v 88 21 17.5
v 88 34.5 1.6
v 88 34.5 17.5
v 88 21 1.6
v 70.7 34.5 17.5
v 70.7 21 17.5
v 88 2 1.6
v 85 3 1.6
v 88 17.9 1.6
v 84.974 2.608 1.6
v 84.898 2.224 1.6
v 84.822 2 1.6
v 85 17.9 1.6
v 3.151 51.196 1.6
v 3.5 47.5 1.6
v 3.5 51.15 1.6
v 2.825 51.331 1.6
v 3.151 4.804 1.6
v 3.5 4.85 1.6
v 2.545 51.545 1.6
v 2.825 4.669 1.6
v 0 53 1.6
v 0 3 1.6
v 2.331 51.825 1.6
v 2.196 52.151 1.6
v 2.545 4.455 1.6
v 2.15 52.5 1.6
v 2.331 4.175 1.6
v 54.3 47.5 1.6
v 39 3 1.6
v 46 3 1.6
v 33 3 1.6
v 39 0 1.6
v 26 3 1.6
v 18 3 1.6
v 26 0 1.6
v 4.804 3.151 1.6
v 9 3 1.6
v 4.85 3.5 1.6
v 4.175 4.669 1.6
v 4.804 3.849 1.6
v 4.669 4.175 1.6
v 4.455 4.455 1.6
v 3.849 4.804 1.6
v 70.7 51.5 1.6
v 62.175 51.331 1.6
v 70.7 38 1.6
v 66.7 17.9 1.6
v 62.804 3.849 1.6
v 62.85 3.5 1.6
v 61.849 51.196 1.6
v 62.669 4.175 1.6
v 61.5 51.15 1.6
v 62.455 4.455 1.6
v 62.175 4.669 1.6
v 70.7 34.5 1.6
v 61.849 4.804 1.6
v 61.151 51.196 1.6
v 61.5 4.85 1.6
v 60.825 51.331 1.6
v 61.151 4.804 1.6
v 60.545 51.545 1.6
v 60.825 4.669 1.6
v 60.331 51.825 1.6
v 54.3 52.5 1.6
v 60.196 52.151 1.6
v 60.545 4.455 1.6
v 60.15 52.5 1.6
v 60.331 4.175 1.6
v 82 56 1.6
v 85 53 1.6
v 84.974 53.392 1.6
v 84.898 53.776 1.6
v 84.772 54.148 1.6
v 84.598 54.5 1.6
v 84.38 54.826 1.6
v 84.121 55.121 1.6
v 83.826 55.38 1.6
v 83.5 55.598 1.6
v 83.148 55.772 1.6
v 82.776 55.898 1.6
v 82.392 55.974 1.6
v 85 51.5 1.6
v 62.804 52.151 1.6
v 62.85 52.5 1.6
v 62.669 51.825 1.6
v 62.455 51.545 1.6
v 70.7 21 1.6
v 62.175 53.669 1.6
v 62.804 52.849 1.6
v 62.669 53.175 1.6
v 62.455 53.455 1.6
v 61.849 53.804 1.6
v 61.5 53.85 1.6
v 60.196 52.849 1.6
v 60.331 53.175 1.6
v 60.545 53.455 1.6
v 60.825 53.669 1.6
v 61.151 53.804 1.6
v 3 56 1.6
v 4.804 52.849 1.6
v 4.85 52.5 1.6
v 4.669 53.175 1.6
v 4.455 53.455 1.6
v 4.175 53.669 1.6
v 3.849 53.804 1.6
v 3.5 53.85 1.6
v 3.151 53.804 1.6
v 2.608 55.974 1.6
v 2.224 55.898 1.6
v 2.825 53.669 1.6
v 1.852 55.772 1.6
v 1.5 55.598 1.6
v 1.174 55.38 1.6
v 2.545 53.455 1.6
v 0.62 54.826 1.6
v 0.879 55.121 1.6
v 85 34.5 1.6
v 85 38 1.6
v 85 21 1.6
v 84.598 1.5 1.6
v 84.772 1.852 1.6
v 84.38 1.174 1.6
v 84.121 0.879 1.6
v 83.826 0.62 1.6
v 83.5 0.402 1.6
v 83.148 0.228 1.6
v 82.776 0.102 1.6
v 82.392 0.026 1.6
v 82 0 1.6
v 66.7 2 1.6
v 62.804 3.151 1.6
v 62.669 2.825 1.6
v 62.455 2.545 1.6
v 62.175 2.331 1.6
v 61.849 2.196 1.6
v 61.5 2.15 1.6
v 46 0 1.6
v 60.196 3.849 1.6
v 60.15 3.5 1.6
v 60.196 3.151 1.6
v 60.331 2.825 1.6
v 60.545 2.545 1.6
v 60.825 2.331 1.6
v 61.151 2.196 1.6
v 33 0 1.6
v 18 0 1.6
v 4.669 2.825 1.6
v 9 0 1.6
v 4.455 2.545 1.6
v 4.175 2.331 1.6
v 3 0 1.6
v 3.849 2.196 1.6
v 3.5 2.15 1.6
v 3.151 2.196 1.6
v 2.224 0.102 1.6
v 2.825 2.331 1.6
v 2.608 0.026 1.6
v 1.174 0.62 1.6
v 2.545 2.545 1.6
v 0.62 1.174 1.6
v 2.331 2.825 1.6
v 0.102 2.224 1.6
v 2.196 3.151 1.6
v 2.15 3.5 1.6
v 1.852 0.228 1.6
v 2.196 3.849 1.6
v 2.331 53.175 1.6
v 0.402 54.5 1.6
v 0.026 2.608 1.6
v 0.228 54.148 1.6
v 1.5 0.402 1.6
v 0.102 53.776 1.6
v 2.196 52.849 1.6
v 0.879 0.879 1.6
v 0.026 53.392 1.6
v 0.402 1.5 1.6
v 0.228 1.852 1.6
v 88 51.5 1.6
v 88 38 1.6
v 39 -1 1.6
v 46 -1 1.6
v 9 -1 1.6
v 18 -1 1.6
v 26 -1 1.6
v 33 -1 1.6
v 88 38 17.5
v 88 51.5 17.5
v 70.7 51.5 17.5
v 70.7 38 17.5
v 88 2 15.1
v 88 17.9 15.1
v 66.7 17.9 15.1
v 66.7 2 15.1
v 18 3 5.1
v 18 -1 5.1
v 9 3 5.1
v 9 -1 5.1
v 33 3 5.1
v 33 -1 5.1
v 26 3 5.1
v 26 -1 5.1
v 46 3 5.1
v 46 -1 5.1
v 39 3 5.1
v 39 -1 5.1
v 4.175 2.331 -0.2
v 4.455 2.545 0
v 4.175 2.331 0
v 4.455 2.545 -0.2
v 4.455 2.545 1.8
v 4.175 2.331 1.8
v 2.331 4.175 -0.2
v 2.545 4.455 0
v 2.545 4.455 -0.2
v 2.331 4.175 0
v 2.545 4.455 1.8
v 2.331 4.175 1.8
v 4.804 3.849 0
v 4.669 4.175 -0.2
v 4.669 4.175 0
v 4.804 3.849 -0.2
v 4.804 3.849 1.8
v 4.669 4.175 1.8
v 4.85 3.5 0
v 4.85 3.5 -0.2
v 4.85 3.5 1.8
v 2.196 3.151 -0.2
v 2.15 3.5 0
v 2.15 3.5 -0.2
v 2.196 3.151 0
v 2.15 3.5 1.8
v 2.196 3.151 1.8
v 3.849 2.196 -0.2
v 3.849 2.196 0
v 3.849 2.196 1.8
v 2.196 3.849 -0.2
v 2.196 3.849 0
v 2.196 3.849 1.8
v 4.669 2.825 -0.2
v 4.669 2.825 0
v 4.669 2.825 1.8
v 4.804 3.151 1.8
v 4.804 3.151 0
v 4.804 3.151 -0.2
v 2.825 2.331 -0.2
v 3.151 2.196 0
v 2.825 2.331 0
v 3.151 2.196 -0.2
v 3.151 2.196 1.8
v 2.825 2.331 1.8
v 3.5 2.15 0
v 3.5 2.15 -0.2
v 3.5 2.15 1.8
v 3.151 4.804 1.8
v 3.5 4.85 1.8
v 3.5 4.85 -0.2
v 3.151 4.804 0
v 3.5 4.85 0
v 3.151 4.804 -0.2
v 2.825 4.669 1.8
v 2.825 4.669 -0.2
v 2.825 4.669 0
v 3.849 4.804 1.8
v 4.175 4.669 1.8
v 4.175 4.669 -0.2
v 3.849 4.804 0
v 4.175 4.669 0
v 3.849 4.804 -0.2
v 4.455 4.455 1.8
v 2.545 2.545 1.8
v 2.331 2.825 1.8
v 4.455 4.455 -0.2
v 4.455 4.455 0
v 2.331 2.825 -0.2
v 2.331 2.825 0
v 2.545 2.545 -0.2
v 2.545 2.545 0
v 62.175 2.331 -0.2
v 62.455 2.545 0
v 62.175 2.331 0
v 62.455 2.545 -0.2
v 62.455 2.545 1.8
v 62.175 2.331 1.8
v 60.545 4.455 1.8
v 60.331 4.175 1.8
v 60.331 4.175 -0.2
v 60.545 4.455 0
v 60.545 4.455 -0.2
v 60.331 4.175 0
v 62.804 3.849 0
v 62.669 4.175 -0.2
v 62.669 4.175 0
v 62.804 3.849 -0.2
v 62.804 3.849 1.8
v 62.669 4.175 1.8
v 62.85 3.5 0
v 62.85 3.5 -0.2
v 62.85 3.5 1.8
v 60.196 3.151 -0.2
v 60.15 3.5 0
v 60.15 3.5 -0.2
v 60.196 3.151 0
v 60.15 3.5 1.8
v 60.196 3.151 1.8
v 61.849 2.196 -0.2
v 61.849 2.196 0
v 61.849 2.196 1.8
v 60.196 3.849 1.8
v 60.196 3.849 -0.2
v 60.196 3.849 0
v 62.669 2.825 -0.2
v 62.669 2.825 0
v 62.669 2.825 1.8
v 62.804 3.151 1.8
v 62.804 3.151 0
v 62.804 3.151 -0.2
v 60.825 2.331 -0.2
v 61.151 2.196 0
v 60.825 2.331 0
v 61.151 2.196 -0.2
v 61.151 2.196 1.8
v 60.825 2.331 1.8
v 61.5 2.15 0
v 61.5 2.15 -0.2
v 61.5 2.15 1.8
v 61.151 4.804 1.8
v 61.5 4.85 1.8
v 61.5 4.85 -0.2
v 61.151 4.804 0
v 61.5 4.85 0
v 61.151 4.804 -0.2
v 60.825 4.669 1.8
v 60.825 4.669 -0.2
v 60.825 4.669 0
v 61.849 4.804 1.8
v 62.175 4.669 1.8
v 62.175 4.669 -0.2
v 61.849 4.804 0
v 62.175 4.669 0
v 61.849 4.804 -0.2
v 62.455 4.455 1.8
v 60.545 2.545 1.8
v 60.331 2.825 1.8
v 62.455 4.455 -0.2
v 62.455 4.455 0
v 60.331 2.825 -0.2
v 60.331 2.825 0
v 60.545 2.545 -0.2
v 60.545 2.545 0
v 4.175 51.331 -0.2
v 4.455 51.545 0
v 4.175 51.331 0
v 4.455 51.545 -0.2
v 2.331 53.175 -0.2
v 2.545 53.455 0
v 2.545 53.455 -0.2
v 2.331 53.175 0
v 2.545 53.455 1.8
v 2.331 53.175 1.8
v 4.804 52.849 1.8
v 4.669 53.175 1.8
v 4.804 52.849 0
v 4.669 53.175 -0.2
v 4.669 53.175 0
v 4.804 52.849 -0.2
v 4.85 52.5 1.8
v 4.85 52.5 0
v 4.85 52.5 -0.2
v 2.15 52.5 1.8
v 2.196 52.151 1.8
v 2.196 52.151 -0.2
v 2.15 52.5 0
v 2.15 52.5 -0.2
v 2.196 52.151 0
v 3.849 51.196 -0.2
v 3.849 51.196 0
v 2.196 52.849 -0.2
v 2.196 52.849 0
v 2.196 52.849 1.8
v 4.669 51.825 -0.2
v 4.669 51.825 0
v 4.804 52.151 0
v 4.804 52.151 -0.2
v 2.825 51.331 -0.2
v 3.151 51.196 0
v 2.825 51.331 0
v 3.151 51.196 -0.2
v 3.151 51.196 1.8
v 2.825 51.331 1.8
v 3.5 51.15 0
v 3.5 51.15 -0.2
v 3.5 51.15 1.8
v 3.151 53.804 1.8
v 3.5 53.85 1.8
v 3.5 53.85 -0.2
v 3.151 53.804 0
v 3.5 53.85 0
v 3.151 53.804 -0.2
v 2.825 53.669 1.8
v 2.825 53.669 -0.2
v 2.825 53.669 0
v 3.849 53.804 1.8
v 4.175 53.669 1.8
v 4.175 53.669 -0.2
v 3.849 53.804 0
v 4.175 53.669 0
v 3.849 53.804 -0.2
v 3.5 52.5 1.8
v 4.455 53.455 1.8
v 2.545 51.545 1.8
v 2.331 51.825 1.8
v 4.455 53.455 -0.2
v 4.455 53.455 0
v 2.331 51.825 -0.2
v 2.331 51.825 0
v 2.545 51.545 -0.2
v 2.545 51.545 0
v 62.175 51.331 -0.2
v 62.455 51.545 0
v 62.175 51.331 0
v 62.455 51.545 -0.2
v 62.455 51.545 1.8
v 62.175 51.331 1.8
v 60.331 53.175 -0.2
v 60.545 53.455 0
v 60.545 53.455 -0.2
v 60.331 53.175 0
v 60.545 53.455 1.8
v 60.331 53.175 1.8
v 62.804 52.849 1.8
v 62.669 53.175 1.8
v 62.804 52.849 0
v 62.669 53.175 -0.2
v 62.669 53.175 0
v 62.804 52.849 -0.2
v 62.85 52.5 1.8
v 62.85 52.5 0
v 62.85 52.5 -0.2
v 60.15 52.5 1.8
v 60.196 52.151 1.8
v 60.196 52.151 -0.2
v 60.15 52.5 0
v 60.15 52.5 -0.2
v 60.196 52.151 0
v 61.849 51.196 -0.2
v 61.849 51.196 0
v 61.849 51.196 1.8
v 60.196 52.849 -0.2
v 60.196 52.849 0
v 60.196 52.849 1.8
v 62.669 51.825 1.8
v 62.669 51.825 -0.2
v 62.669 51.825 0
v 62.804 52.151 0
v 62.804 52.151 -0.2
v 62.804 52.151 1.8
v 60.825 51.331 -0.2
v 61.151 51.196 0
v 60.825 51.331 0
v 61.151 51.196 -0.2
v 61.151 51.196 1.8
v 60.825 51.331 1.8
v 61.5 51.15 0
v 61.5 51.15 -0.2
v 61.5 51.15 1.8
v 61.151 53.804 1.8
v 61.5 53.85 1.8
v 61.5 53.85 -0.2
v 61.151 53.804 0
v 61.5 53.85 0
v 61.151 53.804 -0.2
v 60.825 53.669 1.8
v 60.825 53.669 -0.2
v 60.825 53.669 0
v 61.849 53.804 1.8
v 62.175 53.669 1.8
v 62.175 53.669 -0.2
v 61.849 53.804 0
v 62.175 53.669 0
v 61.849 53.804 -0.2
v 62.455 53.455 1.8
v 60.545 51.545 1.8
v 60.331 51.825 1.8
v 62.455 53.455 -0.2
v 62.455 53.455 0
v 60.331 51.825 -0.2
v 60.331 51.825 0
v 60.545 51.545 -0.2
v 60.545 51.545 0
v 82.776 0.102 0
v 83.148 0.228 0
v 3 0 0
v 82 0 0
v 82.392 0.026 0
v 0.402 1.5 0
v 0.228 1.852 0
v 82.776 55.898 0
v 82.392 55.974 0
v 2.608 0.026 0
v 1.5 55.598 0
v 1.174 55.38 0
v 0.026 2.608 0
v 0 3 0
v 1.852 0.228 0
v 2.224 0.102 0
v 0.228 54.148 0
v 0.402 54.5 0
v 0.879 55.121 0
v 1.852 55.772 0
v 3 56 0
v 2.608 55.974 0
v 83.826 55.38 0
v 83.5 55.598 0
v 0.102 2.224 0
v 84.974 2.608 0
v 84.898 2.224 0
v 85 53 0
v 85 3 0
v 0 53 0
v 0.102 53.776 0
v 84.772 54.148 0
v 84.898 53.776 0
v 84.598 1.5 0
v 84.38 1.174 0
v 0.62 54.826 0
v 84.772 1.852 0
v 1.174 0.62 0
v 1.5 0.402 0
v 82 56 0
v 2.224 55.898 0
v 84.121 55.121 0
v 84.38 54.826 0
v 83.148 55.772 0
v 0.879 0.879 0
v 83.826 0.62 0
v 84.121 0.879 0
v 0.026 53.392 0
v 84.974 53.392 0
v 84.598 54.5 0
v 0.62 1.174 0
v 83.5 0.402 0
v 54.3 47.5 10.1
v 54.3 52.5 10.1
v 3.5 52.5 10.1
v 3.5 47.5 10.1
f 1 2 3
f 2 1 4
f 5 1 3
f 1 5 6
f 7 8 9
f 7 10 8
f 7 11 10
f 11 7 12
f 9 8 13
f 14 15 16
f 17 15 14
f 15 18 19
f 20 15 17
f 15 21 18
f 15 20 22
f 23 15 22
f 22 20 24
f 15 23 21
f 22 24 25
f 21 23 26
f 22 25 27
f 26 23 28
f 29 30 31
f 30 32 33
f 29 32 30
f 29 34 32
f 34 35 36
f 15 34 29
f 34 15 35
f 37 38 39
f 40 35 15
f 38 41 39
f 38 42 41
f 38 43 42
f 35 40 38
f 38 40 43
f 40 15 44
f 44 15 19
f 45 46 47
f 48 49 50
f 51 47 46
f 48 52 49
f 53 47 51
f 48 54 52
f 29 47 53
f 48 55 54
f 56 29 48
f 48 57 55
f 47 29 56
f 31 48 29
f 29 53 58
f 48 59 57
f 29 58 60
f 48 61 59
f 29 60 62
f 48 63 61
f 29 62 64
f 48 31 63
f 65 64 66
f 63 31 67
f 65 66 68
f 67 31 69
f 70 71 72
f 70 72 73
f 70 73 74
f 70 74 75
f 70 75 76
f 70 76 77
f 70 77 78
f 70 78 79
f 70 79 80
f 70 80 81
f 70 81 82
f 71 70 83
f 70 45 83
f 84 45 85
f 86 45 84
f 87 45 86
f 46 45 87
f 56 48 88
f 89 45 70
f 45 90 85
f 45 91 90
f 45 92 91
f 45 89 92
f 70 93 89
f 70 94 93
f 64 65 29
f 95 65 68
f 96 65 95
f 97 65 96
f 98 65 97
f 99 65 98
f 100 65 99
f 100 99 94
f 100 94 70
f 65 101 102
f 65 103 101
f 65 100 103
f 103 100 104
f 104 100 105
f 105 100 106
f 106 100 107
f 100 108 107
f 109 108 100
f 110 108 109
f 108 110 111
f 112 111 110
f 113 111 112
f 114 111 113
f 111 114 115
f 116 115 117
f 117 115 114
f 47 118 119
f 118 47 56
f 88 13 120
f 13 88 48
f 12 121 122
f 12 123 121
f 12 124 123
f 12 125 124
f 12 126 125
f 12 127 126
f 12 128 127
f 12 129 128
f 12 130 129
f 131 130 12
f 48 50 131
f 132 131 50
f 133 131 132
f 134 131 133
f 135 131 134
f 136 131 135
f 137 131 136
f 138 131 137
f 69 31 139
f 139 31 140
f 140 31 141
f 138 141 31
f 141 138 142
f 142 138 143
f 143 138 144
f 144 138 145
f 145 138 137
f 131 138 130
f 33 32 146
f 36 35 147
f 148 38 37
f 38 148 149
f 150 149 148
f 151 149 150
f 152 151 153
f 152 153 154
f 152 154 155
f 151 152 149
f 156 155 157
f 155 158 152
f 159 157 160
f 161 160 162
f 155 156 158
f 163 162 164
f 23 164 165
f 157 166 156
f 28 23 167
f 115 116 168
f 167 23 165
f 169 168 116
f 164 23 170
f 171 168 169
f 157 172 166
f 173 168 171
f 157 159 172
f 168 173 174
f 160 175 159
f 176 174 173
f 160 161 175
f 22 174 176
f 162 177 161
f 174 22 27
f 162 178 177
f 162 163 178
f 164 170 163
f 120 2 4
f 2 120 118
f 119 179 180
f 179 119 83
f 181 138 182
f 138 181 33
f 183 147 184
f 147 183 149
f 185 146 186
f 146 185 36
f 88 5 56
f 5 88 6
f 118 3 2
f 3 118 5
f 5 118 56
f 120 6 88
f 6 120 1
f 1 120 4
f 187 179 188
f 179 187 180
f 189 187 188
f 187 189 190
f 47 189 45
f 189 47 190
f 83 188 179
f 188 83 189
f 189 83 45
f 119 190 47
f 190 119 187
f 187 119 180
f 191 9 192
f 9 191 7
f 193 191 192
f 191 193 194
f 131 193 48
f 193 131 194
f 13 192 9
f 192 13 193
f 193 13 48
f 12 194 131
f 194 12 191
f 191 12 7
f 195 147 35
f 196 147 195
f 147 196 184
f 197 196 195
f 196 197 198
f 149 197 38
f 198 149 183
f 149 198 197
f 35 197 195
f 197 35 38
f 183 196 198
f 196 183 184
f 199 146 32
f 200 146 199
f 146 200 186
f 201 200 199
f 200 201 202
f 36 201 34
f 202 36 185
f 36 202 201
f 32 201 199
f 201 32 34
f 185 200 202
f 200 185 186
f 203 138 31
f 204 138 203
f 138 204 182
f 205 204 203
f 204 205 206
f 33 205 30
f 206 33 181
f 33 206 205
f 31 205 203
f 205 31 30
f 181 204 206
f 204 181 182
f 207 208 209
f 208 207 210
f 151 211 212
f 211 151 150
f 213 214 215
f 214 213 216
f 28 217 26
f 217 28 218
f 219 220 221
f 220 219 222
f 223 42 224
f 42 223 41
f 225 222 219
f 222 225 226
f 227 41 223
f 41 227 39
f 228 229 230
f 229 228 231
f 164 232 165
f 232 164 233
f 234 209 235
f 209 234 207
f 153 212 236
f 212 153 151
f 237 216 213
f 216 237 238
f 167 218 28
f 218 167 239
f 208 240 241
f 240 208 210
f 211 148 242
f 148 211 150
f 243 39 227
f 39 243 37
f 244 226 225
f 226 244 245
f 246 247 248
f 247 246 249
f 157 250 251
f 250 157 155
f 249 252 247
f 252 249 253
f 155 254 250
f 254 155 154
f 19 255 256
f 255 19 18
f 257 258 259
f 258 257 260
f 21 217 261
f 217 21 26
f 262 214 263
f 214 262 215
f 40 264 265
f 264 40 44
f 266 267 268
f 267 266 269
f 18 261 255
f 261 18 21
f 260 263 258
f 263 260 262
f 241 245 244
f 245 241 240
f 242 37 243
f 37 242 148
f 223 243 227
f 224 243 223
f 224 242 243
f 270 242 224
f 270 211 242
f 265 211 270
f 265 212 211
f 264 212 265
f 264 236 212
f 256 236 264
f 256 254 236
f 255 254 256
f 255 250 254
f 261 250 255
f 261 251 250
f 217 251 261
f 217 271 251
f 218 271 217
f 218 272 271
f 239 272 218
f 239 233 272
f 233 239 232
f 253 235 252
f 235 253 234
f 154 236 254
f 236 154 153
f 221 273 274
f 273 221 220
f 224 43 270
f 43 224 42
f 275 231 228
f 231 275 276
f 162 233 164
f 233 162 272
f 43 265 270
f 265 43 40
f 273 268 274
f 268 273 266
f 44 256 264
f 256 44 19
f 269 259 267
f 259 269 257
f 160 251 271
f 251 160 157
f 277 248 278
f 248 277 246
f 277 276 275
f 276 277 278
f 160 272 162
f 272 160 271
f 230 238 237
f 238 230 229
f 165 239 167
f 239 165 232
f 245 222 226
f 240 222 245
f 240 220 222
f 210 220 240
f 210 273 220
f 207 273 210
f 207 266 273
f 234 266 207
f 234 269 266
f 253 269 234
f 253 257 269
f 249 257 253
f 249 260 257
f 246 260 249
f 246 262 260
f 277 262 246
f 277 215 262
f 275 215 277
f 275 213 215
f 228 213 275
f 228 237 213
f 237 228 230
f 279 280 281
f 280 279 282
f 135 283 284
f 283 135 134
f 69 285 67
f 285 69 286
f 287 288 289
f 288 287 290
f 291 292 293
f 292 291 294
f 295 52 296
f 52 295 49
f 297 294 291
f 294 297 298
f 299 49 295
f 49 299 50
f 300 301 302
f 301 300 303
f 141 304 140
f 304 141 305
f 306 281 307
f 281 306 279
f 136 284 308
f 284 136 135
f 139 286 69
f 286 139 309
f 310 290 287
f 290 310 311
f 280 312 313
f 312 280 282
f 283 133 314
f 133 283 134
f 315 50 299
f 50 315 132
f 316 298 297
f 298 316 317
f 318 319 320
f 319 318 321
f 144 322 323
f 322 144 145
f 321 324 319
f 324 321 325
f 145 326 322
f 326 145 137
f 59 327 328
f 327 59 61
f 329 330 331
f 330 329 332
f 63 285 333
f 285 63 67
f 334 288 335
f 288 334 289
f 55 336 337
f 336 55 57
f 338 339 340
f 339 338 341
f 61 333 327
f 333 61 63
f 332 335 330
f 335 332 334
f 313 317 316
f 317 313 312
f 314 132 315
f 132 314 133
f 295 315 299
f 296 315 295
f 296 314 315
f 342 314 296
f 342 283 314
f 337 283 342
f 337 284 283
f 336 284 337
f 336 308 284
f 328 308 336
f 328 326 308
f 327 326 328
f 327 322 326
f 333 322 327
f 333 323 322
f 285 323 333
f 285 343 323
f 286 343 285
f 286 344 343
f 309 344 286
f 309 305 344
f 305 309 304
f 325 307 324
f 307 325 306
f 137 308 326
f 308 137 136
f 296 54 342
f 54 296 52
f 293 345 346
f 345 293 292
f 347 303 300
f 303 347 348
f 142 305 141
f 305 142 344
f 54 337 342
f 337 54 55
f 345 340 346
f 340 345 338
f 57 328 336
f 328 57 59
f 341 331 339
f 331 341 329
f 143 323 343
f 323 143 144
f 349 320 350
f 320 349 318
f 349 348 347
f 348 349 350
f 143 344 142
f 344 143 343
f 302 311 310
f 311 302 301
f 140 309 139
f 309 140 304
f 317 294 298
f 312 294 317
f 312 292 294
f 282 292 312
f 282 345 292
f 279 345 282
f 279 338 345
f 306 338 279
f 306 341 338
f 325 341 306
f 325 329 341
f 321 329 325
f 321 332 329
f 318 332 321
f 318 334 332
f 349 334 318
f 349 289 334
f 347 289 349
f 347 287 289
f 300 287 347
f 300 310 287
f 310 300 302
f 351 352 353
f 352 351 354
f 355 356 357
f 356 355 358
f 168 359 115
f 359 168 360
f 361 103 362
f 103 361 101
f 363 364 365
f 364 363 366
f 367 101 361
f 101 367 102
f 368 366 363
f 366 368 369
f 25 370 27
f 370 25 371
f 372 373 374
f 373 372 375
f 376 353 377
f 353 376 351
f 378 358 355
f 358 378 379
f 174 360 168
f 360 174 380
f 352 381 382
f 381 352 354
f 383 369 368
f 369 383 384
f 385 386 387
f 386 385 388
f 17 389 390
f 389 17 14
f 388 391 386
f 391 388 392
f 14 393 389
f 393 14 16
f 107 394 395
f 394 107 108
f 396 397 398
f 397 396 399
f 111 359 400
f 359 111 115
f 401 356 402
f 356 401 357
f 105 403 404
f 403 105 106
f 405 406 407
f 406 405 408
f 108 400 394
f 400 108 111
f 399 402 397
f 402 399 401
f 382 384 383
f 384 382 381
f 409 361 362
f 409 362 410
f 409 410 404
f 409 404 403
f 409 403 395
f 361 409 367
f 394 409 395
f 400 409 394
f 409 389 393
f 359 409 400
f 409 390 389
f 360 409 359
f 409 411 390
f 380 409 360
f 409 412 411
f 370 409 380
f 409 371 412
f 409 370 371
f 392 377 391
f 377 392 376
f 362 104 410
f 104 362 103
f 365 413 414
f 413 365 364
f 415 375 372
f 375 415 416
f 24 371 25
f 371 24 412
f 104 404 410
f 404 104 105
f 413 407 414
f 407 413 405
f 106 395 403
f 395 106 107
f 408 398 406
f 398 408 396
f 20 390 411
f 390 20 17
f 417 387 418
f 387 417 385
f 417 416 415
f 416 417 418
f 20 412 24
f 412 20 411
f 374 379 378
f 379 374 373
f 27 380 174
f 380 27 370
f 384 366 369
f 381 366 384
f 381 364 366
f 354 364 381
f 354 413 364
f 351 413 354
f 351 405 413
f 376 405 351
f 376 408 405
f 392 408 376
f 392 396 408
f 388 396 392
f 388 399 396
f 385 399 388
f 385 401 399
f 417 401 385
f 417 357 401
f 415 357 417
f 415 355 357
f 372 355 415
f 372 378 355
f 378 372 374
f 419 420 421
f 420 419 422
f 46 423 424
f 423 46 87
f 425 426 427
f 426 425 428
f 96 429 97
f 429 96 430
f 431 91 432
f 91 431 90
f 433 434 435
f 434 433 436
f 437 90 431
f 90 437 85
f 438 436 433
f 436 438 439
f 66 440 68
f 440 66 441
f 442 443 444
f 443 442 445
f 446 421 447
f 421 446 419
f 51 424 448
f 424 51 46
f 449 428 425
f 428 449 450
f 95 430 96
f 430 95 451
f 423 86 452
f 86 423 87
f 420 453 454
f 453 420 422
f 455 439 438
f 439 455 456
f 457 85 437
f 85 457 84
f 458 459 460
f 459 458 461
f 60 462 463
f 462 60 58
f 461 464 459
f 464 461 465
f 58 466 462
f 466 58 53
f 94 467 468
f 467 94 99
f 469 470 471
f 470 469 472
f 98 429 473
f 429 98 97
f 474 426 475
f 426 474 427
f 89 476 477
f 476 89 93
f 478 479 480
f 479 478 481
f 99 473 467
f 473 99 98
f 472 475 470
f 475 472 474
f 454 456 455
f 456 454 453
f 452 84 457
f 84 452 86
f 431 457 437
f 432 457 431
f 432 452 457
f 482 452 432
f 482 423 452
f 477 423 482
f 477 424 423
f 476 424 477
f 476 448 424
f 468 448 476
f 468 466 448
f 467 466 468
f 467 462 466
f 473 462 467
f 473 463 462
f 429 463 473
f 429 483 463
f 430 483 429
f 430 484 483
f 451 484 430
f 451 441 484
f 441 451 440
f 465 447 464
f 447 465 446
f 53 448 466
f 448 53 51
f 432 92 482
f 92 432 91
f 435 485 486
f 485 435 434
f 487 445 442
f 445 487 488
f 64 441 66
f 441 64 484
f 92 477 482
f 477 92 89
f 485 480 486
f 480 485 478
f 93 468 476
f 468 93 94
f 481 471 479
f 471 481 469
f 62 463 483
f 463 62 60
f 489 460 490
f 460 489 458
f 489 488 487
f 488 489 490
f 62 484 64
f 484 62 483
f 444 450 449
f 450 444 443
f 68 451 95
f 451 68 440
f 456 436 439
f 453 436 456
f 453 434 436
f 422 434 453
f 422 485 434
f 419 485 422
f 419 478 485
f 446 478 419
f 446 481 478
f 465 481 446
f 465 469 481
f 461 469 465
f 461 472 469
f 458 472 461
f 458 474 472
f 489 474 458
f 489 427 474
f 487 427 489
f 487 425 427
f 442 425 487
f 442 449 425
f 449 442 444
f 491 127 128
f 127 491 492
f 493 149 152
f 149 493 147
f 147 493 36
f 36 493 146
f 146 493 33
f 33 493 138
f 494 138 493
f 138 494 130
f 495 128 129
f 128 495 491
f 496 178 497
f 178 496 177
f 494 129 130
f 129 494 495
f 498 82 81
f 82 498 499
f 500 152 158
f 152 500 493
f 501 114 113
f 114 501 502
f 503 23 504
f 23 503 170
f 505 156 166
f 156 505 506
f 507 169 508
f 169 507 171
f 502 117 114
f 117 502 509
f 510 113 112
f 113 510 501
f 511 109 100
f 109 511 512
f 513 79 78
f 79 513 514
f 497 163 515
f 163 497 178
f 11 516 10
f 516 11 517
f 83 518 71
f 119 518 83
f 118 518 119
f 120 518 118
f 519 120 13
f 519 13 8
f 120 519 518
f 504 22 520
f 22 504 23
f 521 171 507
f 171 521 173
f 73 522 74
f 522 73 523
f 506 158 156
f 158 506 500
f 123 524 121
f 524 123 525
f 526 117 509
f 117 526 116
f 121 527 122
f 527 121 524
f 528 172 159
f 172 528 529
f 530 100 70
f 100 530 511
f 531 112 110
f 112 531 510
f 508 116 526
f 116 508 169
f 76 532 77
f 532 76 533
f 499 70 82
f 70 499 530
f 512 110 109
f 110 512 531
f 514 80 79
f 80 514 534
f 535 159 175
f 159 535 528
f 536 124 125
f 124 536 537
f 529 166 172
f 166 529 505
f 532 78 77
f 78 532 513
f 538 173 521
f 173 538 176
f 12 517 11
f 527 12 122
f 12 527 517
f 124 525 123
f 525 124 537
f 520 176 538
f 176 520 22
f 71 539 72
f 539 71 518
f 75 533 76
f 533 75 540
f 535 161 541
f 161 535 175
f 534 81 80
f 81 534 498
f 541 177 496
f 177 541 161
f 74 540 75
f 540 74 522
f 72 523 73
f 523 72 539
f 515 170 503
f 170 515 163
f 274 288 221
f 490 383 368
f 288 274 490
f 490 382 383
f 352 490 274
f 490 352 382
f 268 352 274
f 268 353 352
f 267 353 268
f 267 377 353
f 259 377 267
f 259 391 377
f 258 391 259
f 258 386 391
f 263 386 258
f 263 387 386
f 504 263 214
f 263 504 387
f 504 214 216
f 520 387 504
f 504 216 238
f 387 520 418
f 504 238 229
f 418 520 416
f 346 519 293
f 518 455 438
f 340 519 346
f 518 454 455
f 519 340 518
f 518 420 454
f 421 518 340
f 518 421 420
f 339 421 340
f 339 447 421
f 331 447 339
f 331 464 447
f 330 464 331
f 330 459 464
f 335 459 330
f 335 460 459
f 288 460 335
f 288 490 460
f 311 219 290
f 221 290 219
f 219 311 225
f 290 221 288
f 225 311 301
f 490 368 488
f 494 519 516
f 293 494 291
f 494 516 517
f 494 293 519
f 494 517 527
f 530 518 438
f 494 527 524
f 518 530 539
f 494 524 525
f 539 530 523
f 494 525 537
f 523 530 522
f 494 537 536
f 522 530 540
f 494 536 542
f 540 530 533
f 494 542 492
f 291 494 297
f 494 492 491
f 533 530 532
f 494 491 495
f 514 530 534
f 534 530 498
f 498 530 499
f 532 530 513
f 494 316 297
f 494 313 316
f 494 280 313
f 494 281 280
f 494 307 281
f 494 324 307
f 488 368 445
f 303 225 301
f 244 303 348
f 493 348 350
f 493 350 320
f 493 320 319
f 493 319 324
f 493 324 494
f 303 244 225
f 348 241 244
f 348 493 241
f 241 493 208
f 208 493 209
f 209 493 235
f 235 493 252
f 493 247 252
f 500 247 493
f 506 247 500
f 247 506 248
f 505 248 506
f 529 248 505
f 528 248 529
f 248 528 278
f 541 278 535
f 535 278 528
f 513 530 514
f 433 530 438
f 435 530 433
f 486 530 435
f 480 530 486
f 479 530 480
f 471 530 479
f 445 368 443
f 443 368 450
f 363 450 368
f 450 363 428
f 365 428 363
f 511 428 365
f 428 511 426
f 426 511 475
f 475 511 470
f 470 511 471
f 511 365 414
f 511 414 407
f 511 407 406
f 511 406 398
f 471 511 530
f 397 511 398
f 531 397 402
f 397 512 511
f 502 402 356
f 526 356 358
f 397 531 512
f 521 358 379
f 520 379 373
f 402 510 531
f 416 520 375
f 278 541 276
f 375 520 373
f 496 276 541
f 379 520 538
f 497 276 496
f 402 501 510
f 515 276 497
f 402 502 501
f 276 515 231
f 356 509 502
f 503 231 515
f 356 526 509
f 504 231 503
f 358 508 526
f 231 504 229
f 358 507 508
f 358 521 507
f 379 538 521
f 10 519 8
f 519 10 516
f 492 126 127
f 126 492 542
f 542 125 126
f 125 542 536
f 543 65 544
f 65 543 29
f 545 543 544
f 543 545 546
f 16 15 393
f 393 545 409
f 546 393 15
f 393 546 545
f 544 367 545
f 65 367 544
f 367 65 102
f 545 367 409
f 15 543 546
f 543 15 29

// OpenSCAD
/* =============================================================================
 * 智慧香爐 — 外購元件：Raspberry Pi 5
 * =============================================================================
 * ★★ 這不是列印件，是外購品的示意模型 ★★
 * 尺寸來自 ../params.scad，板外形 85×56 與孔位為官方公開值，連接器高度為常見規格（估）。
 * 用途：組裝干涉檢查、螺絲可及性、目視確認裝得下。
 * ★不可當成實際尺寸寫進報告★（CLAUDE.md §7）
 *
 * 原點：PCB 左下角、z=0 為板底
 * ============================================================================= */

include <../params.scad>


module pi5() {
    // PCB
    color("#1c6b3c") linear_extrude(PCB_T)
        offset(r = 3) offset(r = -3) square([PI_W, PI_D]);

    color("#b8bcc0") {
        // ── 短邊（x = PI_W 側）：RJ45 ＋ 兩組雙層 USB-A ──
        // 連接器外露到板外，這正是干涉檢查要看的：後面板開孔對不對得上
        translate([PI_W - PI_RJ45_L + 3, 2, PCB_T])
            cube([PI_RJ45_L, PI_RJ45_W, PI_RJ45_H]);
        for (y = [21, 38])
            translate([PI_W - PI_USB_L + 3, y, PCB_T])
                cube([PI_USB_L, PI_USB_W, PI_USB_H]);
    }

    // ── 長邊（y = 0 側）：USB-C 供電 ＋ 兩個 micro-HDMI ──
    color("#d0d3d6") {
        translate([9, -1, PCB_T])  cube([PI_USBC_W, 4, PI_USBC_H]);
        translate([26, -1, PCB_T]) cube([PI_HDMI_W, 4, PI_HDMI_H]);
        translate([39, -1, PCB_T]) cube([PI_HDMI_W, 4, PI_HDMI_H]);
    }

    // ── 長邊（y = PI_D 側）：40 針 GPIO ──
    color("#2b2b2b")
        translate([3.5, PI_D - PI_GPIO_W - 3.5, PCB_T])
            cube([PI_GPIO_L, PI_GPIO_W, PI_GPIO_H]);

    // 安裝孔（★M4 穿不過★ ⌀2.7，只能 M2.5——見 params.scad 螺絲規格）
    color("#8a8f94") for (p = PI_SCREW)
        translate([p[0], p[1], -0.2]) cylinder(h = PCB_T + 0.4, d = 2.7, $fn = 24);
}

// ── 單獨開檔時的預覽（被 use<> 引入時不執行）──
pi5();
